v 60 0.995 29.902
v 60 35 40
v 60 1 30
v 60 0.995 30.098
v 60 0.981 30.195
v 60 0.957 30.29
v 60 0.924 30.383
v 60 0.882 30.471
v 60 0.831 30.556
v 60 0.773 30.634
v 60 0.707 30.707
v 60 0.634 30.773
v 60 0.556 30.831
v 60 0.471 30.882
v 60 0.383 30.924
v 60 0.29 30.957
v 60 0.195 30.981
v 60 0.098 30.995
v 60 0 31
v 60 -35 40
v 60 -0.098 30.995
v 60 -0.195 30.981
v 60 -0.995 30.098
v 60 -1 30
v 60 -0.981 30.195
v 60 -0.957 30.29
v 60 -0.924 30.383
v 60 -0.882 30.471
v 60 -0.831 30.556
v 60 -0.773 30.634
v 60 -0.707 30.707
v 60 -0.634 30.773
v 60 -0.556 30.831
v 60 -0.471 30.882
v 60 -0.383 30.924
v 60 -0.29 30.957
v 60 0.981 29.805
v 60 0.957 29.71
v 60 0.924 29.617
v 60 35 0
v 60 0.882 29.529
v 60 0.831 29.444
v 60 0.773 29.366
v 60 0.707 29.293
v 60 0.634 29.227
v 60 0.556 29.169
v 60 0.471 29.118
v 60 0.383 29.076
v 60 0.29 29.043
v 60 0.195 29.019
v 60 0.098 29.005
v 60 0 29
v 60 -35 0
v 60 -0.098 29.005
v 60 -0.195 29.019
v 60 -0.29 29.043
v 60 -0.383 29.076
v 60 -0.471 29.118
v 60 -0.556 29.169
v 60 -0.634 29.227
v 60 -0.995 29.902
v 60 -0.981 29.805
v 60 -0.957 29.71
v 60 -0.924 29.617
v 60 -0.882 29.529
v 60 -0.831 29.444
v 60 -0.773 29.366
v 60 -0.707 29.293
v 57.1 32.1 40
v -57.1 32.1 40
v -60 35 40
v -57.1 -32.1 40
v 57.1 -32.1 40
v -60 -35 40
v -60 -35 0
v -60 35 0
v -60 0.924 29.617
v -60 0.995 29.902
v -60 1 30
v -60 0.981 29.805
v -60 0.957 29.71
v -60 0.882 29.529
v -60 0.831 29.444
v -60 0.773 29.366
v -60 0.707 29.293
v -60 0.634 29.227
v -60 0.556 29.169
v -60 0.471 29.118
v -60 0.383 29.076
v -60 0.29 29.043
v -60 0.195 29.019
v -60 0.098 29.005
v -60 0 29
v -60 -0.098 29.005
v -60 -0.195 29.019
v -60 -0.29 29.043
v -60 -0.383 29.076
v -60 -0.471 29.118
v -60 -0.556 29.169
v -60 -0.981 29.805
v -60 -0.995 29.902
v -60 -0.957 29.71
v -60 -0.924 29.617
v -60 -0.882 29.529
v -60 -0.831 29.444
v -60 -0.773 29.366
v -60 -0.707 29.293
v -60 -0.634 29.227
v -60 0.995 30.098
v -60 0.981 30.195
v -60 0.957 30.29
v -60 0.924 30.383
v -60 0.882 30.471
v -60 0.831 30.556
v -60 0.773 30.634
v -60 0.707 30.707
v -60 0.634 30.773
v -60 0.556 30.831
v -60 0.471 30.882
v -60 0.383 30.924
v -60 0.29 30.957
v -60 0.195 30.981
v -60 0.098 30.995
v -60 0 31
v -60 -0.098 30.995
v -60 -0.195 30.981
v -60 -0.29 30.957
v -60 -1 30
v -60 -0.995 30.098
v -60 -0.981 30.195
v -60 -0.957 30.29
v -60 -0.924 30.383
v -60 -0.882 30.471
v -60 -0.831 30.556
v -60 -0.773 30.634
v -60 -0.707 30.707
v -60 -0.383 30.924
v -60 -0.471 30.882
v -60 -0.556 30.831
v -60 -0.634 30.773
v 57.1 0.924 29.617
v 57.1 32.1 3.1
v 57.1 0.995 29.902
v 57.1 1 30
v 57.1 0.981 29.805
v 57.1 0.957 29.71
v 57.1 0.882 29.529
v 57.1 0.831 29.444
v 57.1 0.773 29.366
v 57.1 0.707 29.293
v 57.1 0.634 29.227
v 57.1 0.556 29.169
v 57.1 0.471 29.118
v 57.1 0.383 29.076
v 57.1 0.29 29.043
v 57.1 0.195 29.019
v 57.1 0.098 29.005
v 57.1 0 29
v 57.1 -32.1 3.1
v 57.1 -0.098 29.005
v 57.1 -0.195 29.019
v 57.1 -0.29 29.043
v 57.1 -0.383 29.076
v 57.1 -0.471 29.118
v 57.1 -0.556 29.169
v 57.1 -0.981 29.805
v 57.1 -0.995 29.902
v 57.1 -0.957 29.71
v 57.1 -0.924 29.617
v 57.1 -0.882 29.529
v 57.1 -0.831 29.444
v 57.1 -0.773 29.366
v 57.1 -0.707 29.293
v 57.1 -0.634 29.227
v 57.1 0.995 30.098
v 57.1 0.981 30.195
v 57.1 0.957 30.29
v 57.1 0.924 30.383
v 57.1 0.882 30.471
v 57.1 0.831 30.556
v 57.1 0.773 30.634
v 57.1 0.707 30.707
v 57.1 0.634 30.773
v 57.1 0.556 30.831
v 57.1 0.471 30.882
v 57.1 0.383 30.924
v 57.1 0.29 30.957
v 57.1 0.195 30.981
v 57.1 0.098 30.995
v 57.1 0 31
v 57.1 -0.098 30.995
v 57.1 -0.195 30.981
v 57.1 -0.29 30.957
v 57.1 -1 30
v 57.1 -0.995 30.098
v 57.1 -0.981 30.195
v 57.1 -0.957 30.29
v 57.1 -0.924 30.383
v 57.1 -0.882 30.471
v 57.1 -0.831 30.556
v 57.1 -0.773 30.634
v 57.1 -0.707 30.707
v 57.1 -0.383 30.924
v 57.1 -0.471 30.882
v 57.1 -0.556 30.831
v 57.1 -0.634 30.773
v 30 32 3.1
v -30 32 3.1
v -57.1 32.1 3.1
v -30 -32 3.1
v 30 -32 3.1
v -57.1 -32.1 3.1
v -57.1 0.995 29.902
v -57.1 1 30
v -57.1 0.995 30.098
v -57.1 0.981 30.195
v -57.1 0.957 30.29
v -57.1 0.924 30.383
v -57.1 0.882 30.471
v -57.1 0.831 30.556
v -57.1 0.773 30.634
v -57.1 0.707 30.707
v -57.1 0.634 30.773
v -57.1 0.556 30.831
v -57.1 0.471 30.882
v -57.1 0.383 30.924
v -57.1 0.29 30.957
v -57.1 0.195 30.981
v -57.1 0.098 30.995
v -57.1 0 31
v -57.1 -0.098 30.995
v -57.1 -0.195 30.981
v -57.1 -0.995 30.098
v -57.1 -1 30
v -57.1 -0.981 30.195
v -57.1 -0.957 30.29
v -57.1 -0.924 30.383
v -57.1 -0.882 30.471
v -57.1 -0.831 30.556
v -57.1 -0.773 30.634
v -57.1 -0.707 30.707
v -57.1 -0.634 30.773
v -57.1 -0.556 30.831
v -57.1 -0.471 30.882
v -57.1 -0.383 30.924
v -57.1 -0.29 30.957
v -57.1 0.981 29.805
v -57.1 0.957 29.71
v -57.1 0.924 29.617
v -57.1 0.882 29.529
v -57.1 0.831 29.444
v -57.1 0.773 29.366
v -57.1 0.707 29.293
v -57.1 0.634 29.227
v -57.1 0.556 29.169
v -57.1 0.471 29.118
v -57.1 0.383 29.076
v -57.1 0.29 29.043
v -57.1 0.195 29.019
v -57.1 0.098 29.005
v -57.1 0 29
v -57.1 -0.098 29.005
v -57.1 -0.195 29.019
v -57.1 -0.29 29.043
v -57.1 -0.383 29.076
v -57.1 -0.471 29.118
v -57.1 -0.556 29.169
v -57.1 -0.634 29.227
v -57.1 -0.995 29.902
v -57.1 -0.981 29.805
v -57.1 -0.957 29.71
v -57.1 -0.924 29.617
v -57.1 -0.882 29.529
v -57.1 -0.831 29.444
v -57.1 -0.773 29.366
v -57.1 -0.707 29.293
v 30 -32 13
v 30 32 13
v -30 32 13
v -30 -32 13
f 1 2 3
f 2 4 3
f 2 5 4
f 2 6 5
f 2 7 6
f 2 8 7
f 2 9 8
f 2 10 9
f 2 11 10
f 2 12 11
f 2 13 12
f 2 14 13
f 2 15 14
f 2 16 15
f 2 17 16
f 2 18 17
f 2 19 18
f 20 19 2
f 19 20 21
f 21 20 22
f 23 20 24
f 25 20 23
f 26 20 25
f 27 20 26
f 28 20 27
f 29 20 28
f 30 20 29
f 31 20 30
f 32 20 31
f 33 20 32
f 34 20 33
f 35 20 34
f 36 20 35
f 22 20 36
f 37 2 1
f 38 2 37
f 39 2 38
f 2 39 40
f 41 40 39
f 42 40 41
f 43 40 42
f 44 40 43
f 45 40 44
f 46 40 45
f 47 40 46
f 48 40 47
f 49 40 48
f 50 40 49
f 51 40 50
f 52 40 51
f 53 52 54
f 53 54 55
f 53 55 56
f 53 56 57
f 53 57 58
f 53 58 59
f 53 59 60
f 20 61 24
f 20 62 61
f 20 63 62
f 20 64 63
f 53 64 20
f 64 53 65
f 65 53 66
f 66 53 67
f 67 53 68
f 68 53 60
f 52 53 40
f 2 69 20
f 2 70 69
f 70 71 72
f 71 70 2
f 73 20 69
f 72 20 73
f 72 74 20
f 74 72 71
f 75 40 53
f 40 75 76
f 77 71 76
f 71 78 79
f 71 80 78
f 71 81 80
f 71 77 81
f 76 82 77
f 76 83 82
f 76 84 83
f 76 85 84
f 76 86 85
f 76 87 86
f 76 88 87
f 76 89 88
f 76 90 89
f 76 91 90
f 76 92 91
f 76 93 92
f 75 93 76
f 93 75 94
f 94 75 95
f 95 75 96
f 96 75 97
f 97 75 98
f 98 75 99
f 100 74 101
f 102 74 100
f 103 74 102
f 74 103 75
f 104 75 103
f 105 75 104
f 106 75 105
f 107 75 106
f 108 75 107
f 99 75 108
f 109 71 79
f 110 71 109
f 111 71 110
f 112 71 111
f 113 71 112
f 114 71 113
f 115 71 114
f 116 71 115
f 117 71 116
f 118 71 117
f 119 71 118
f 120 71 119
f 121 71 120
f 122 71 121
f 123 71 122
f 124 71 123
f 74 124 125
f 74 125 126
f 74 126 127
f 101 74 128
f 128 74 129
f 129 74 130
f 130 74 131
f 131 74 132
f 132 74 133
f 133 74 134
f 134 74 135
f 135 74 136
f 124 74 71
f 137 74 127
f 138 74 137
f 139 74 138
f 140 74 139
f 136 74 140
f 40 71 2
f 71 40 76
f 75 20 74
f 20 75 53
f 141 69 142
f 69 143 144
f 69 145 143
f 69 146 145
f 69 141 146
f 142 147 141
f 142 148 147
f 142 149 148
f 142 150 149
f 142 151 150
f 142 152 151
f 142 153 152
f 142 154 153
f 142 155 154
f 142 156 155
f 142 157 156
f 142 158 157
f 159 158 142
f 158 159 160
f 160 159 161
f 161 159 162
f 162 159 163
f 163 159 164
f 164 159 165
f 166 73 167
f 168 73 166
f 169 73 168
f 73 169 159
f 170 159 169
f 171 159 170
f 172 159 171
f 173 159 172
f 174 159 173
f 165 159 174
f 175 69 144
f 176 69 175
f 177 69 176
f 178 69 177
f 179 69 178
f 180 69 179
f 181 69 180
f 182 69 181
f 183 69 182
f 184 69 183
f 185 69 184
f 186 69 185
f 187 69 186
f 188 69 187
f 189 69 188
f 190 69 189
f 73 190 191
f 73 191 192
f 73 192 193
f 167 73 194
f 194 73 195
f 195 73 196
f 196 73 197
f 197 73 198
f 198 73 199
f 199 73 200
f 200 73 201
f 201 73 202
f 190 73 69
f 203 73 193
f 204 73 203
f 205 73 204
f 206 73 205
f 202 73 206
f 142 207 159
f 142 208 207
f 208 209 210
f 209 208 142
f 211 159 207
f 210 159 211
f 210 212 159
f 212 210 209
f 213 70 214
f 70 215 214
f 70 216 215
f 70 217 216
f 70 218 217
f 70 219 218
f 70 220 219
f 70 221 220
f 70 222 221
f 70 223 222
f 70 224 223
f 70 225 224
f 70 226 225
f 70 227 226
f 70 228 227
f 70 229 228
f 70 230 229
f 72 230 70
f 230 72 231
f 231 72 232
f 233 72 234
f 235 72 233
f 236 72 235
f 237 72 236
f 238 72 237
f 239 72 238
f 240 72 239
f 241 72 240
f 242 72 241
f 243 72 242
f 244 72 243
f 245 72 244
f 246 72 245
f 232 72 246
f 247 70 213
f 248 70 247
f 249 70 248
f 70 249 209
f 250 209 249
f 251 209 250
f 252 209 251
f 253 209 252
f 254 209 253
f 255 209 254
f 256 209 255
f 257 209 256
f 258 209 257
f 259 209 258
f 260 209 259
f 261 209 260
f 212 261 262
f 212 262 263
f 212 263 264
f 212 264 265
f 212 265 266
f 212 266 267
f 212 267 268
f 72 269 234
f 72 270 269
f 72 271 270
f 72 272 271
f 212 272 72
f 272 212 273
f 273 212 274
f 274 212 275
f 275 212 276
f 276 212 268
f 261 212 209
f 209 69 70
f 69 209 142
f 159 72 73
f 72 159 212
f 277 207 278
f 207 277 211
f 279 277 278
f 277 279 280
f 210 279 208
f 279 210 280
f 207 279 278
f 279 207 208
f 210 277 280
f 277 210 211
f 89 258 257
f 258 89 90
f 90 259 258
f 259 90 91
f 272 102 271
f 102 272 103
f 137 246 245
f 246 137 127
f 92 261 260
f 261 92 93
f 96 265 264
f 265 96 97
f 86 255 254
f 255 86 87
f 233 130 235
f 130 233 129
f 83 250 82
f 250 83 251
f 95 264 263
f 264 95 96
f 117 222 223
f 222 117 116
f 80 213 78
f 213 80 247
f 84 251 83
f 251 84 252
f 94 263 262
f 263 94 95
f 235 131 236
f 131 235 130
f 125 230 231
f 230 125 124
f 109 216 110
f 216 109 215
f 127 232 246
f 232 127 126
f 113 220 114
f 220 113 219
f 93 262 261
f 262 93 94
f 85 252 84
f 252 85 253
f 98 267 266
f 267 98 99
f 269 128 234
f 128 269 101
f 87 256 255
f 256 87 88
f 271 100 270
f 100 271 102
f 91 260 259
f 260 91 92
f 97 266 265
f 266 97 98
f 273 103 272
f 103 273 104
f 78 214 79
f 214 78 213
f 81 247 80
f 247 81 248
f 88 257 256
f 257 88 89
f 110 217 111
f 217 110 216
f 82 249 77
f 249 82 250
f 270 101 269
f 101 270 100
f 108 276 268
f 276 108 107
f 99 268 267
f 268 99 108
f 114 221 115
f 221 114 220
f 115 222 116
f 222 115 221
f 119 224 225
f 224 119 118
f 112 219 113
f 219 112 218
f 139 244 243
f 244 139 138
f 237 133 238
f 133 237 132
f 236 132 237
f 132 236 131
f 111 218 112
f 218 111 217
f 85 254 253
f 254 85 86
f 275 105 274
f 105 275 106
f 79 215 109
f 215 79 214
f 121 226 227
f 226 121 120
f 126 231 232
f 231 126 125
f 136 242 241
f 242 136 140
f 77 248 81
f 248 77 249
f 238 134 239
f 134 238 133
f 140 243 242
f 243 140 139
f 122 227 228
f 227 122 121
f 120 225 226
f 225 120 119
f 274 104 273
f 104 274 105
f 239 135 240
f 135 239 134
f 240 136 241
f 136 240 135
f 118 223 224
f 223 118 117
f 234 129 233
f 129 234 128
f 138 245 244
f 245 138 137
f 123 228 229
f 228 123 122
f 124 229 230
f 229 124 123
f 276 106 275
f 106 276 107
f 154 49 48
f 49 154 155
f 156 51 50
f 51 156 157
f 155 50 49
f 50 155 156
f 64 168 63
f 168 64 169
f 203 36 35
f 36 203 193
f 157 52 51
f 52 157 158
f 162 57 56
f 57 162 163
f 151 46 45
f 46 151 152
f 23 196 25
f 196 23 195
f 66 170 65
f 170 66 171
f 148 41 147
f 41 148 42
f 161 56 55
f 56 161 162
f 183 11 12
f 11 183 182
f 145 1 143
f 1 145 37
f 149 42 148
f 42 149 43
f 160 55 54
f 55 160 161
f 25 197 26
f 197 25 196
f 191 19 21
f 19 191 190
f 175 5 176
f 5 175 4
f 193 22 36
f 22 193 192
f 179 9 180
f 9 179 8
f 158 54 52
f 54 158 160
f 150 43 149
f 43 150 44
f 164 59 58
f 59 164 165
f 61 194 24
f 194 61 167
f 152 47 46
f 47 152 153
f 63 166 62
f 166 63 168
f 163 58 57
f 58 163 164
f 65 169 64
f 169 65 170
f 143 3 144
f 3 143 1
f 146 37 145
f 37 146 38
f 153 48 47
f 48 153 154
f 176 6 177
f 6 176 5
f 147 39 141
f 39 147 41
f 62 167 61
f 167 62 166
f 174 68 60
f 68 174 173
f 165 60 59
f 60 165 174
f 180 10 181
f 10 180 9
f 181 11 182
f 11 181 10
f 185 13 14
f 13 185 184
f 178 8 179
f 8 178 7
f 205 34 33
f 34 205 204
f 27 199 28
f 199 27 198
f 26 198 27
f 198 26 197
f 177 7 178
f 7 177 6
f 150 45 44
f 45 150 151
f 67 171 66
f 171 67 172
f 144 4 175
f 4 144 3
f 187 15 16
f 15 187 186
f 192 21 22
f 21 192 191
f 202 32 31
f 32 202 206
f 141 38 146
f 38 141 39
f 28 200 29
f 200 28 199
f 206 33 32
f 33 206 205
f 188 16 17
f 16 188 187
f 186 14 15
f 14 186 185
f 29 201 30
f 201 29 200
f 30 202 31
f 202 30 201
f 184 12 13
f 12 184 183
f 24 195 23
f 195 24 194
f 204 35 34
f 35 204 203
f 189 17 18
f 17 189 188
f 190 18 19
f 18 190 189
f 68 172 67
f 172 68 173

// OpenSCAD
// Parameters (mm)
outer_x = 120;               // outer dimension X
outer_y = 70;                // outer dimension Y
outer_z = 40;                // outer dimension Z (height)
wall_thick = 3;              // wall thickness
floor_thick = 3;             // floor thickness

inner_x = outer_x - 2*wall_thick;   // inner cavity X
inner_y = outer_y - 2*wall_thick;   // inner cavity Y
inner_z = outer_z - floor_thick;    // inner cavity Z (open top)

platform_len = 60;           // platform length in X (centred)
platform_top_z = 13;         // absolute Z of platform top
platform_bottom_z = floor_thick; // absolute Z of inner floor
platform_thick = platform_top_z - platform_bottom_z; // platform thickness

hole_d = 2;                  // electrode hole diameter
hole_r = hole_d/2;
hole_z = 30;                 // absolute Z of hole centre
hole_y = 0;                  // absolute Y of hole centre (center line)

// Set resolution for curved features
$fn = 64;

// Outer shell (outer cube minus inner cavity)
module outer_shell() {
    difference() {
        // outer solid, centred on origin
        translate([-outer_x/2, -outer_y/2, 0])
            cube([outer_x, outer_y, outer_z]);

        // inner cavity, start just above the floor to keep the floor solid
        translate([-inner_x/2 - 0.1, -inner_y/2 - 0.1, floor_thick + 0.1])
            cube([inner_x + 0.2, inner_y + 0.2, inner_z + 0.2]); // extend a bit beyond top
    }
}

// Platform (solid raised tray)
module platform() {
    translate([-platform_len/2, -inner_y/2, floor_thick])
        cube([platform_len, inner_y, platform_thick]);
}

// Electrode holes through the end walls (horizontal along X)
module electrode_holes() {
    // left end wall
    translate([-(outer_x/2) + wall_thick/2, hole_y, hole_z])
        rotate([0, 90, 0])
            cylinder(h = wall_thick + 0.2, r = hole_r, center = true);
    // right end wall
    translate([(outer_x/2) - wall_thick/2, hole_y, hole_z])
        rotate([0, 90, 0])
            cylinder(h = wall_thick + 0.2, r = hole_r, center = true);
}

// Final part (single solid body)
difference() {
    union() {
        outer_shell();
        platform();
    }
    electrode_holes();
}
